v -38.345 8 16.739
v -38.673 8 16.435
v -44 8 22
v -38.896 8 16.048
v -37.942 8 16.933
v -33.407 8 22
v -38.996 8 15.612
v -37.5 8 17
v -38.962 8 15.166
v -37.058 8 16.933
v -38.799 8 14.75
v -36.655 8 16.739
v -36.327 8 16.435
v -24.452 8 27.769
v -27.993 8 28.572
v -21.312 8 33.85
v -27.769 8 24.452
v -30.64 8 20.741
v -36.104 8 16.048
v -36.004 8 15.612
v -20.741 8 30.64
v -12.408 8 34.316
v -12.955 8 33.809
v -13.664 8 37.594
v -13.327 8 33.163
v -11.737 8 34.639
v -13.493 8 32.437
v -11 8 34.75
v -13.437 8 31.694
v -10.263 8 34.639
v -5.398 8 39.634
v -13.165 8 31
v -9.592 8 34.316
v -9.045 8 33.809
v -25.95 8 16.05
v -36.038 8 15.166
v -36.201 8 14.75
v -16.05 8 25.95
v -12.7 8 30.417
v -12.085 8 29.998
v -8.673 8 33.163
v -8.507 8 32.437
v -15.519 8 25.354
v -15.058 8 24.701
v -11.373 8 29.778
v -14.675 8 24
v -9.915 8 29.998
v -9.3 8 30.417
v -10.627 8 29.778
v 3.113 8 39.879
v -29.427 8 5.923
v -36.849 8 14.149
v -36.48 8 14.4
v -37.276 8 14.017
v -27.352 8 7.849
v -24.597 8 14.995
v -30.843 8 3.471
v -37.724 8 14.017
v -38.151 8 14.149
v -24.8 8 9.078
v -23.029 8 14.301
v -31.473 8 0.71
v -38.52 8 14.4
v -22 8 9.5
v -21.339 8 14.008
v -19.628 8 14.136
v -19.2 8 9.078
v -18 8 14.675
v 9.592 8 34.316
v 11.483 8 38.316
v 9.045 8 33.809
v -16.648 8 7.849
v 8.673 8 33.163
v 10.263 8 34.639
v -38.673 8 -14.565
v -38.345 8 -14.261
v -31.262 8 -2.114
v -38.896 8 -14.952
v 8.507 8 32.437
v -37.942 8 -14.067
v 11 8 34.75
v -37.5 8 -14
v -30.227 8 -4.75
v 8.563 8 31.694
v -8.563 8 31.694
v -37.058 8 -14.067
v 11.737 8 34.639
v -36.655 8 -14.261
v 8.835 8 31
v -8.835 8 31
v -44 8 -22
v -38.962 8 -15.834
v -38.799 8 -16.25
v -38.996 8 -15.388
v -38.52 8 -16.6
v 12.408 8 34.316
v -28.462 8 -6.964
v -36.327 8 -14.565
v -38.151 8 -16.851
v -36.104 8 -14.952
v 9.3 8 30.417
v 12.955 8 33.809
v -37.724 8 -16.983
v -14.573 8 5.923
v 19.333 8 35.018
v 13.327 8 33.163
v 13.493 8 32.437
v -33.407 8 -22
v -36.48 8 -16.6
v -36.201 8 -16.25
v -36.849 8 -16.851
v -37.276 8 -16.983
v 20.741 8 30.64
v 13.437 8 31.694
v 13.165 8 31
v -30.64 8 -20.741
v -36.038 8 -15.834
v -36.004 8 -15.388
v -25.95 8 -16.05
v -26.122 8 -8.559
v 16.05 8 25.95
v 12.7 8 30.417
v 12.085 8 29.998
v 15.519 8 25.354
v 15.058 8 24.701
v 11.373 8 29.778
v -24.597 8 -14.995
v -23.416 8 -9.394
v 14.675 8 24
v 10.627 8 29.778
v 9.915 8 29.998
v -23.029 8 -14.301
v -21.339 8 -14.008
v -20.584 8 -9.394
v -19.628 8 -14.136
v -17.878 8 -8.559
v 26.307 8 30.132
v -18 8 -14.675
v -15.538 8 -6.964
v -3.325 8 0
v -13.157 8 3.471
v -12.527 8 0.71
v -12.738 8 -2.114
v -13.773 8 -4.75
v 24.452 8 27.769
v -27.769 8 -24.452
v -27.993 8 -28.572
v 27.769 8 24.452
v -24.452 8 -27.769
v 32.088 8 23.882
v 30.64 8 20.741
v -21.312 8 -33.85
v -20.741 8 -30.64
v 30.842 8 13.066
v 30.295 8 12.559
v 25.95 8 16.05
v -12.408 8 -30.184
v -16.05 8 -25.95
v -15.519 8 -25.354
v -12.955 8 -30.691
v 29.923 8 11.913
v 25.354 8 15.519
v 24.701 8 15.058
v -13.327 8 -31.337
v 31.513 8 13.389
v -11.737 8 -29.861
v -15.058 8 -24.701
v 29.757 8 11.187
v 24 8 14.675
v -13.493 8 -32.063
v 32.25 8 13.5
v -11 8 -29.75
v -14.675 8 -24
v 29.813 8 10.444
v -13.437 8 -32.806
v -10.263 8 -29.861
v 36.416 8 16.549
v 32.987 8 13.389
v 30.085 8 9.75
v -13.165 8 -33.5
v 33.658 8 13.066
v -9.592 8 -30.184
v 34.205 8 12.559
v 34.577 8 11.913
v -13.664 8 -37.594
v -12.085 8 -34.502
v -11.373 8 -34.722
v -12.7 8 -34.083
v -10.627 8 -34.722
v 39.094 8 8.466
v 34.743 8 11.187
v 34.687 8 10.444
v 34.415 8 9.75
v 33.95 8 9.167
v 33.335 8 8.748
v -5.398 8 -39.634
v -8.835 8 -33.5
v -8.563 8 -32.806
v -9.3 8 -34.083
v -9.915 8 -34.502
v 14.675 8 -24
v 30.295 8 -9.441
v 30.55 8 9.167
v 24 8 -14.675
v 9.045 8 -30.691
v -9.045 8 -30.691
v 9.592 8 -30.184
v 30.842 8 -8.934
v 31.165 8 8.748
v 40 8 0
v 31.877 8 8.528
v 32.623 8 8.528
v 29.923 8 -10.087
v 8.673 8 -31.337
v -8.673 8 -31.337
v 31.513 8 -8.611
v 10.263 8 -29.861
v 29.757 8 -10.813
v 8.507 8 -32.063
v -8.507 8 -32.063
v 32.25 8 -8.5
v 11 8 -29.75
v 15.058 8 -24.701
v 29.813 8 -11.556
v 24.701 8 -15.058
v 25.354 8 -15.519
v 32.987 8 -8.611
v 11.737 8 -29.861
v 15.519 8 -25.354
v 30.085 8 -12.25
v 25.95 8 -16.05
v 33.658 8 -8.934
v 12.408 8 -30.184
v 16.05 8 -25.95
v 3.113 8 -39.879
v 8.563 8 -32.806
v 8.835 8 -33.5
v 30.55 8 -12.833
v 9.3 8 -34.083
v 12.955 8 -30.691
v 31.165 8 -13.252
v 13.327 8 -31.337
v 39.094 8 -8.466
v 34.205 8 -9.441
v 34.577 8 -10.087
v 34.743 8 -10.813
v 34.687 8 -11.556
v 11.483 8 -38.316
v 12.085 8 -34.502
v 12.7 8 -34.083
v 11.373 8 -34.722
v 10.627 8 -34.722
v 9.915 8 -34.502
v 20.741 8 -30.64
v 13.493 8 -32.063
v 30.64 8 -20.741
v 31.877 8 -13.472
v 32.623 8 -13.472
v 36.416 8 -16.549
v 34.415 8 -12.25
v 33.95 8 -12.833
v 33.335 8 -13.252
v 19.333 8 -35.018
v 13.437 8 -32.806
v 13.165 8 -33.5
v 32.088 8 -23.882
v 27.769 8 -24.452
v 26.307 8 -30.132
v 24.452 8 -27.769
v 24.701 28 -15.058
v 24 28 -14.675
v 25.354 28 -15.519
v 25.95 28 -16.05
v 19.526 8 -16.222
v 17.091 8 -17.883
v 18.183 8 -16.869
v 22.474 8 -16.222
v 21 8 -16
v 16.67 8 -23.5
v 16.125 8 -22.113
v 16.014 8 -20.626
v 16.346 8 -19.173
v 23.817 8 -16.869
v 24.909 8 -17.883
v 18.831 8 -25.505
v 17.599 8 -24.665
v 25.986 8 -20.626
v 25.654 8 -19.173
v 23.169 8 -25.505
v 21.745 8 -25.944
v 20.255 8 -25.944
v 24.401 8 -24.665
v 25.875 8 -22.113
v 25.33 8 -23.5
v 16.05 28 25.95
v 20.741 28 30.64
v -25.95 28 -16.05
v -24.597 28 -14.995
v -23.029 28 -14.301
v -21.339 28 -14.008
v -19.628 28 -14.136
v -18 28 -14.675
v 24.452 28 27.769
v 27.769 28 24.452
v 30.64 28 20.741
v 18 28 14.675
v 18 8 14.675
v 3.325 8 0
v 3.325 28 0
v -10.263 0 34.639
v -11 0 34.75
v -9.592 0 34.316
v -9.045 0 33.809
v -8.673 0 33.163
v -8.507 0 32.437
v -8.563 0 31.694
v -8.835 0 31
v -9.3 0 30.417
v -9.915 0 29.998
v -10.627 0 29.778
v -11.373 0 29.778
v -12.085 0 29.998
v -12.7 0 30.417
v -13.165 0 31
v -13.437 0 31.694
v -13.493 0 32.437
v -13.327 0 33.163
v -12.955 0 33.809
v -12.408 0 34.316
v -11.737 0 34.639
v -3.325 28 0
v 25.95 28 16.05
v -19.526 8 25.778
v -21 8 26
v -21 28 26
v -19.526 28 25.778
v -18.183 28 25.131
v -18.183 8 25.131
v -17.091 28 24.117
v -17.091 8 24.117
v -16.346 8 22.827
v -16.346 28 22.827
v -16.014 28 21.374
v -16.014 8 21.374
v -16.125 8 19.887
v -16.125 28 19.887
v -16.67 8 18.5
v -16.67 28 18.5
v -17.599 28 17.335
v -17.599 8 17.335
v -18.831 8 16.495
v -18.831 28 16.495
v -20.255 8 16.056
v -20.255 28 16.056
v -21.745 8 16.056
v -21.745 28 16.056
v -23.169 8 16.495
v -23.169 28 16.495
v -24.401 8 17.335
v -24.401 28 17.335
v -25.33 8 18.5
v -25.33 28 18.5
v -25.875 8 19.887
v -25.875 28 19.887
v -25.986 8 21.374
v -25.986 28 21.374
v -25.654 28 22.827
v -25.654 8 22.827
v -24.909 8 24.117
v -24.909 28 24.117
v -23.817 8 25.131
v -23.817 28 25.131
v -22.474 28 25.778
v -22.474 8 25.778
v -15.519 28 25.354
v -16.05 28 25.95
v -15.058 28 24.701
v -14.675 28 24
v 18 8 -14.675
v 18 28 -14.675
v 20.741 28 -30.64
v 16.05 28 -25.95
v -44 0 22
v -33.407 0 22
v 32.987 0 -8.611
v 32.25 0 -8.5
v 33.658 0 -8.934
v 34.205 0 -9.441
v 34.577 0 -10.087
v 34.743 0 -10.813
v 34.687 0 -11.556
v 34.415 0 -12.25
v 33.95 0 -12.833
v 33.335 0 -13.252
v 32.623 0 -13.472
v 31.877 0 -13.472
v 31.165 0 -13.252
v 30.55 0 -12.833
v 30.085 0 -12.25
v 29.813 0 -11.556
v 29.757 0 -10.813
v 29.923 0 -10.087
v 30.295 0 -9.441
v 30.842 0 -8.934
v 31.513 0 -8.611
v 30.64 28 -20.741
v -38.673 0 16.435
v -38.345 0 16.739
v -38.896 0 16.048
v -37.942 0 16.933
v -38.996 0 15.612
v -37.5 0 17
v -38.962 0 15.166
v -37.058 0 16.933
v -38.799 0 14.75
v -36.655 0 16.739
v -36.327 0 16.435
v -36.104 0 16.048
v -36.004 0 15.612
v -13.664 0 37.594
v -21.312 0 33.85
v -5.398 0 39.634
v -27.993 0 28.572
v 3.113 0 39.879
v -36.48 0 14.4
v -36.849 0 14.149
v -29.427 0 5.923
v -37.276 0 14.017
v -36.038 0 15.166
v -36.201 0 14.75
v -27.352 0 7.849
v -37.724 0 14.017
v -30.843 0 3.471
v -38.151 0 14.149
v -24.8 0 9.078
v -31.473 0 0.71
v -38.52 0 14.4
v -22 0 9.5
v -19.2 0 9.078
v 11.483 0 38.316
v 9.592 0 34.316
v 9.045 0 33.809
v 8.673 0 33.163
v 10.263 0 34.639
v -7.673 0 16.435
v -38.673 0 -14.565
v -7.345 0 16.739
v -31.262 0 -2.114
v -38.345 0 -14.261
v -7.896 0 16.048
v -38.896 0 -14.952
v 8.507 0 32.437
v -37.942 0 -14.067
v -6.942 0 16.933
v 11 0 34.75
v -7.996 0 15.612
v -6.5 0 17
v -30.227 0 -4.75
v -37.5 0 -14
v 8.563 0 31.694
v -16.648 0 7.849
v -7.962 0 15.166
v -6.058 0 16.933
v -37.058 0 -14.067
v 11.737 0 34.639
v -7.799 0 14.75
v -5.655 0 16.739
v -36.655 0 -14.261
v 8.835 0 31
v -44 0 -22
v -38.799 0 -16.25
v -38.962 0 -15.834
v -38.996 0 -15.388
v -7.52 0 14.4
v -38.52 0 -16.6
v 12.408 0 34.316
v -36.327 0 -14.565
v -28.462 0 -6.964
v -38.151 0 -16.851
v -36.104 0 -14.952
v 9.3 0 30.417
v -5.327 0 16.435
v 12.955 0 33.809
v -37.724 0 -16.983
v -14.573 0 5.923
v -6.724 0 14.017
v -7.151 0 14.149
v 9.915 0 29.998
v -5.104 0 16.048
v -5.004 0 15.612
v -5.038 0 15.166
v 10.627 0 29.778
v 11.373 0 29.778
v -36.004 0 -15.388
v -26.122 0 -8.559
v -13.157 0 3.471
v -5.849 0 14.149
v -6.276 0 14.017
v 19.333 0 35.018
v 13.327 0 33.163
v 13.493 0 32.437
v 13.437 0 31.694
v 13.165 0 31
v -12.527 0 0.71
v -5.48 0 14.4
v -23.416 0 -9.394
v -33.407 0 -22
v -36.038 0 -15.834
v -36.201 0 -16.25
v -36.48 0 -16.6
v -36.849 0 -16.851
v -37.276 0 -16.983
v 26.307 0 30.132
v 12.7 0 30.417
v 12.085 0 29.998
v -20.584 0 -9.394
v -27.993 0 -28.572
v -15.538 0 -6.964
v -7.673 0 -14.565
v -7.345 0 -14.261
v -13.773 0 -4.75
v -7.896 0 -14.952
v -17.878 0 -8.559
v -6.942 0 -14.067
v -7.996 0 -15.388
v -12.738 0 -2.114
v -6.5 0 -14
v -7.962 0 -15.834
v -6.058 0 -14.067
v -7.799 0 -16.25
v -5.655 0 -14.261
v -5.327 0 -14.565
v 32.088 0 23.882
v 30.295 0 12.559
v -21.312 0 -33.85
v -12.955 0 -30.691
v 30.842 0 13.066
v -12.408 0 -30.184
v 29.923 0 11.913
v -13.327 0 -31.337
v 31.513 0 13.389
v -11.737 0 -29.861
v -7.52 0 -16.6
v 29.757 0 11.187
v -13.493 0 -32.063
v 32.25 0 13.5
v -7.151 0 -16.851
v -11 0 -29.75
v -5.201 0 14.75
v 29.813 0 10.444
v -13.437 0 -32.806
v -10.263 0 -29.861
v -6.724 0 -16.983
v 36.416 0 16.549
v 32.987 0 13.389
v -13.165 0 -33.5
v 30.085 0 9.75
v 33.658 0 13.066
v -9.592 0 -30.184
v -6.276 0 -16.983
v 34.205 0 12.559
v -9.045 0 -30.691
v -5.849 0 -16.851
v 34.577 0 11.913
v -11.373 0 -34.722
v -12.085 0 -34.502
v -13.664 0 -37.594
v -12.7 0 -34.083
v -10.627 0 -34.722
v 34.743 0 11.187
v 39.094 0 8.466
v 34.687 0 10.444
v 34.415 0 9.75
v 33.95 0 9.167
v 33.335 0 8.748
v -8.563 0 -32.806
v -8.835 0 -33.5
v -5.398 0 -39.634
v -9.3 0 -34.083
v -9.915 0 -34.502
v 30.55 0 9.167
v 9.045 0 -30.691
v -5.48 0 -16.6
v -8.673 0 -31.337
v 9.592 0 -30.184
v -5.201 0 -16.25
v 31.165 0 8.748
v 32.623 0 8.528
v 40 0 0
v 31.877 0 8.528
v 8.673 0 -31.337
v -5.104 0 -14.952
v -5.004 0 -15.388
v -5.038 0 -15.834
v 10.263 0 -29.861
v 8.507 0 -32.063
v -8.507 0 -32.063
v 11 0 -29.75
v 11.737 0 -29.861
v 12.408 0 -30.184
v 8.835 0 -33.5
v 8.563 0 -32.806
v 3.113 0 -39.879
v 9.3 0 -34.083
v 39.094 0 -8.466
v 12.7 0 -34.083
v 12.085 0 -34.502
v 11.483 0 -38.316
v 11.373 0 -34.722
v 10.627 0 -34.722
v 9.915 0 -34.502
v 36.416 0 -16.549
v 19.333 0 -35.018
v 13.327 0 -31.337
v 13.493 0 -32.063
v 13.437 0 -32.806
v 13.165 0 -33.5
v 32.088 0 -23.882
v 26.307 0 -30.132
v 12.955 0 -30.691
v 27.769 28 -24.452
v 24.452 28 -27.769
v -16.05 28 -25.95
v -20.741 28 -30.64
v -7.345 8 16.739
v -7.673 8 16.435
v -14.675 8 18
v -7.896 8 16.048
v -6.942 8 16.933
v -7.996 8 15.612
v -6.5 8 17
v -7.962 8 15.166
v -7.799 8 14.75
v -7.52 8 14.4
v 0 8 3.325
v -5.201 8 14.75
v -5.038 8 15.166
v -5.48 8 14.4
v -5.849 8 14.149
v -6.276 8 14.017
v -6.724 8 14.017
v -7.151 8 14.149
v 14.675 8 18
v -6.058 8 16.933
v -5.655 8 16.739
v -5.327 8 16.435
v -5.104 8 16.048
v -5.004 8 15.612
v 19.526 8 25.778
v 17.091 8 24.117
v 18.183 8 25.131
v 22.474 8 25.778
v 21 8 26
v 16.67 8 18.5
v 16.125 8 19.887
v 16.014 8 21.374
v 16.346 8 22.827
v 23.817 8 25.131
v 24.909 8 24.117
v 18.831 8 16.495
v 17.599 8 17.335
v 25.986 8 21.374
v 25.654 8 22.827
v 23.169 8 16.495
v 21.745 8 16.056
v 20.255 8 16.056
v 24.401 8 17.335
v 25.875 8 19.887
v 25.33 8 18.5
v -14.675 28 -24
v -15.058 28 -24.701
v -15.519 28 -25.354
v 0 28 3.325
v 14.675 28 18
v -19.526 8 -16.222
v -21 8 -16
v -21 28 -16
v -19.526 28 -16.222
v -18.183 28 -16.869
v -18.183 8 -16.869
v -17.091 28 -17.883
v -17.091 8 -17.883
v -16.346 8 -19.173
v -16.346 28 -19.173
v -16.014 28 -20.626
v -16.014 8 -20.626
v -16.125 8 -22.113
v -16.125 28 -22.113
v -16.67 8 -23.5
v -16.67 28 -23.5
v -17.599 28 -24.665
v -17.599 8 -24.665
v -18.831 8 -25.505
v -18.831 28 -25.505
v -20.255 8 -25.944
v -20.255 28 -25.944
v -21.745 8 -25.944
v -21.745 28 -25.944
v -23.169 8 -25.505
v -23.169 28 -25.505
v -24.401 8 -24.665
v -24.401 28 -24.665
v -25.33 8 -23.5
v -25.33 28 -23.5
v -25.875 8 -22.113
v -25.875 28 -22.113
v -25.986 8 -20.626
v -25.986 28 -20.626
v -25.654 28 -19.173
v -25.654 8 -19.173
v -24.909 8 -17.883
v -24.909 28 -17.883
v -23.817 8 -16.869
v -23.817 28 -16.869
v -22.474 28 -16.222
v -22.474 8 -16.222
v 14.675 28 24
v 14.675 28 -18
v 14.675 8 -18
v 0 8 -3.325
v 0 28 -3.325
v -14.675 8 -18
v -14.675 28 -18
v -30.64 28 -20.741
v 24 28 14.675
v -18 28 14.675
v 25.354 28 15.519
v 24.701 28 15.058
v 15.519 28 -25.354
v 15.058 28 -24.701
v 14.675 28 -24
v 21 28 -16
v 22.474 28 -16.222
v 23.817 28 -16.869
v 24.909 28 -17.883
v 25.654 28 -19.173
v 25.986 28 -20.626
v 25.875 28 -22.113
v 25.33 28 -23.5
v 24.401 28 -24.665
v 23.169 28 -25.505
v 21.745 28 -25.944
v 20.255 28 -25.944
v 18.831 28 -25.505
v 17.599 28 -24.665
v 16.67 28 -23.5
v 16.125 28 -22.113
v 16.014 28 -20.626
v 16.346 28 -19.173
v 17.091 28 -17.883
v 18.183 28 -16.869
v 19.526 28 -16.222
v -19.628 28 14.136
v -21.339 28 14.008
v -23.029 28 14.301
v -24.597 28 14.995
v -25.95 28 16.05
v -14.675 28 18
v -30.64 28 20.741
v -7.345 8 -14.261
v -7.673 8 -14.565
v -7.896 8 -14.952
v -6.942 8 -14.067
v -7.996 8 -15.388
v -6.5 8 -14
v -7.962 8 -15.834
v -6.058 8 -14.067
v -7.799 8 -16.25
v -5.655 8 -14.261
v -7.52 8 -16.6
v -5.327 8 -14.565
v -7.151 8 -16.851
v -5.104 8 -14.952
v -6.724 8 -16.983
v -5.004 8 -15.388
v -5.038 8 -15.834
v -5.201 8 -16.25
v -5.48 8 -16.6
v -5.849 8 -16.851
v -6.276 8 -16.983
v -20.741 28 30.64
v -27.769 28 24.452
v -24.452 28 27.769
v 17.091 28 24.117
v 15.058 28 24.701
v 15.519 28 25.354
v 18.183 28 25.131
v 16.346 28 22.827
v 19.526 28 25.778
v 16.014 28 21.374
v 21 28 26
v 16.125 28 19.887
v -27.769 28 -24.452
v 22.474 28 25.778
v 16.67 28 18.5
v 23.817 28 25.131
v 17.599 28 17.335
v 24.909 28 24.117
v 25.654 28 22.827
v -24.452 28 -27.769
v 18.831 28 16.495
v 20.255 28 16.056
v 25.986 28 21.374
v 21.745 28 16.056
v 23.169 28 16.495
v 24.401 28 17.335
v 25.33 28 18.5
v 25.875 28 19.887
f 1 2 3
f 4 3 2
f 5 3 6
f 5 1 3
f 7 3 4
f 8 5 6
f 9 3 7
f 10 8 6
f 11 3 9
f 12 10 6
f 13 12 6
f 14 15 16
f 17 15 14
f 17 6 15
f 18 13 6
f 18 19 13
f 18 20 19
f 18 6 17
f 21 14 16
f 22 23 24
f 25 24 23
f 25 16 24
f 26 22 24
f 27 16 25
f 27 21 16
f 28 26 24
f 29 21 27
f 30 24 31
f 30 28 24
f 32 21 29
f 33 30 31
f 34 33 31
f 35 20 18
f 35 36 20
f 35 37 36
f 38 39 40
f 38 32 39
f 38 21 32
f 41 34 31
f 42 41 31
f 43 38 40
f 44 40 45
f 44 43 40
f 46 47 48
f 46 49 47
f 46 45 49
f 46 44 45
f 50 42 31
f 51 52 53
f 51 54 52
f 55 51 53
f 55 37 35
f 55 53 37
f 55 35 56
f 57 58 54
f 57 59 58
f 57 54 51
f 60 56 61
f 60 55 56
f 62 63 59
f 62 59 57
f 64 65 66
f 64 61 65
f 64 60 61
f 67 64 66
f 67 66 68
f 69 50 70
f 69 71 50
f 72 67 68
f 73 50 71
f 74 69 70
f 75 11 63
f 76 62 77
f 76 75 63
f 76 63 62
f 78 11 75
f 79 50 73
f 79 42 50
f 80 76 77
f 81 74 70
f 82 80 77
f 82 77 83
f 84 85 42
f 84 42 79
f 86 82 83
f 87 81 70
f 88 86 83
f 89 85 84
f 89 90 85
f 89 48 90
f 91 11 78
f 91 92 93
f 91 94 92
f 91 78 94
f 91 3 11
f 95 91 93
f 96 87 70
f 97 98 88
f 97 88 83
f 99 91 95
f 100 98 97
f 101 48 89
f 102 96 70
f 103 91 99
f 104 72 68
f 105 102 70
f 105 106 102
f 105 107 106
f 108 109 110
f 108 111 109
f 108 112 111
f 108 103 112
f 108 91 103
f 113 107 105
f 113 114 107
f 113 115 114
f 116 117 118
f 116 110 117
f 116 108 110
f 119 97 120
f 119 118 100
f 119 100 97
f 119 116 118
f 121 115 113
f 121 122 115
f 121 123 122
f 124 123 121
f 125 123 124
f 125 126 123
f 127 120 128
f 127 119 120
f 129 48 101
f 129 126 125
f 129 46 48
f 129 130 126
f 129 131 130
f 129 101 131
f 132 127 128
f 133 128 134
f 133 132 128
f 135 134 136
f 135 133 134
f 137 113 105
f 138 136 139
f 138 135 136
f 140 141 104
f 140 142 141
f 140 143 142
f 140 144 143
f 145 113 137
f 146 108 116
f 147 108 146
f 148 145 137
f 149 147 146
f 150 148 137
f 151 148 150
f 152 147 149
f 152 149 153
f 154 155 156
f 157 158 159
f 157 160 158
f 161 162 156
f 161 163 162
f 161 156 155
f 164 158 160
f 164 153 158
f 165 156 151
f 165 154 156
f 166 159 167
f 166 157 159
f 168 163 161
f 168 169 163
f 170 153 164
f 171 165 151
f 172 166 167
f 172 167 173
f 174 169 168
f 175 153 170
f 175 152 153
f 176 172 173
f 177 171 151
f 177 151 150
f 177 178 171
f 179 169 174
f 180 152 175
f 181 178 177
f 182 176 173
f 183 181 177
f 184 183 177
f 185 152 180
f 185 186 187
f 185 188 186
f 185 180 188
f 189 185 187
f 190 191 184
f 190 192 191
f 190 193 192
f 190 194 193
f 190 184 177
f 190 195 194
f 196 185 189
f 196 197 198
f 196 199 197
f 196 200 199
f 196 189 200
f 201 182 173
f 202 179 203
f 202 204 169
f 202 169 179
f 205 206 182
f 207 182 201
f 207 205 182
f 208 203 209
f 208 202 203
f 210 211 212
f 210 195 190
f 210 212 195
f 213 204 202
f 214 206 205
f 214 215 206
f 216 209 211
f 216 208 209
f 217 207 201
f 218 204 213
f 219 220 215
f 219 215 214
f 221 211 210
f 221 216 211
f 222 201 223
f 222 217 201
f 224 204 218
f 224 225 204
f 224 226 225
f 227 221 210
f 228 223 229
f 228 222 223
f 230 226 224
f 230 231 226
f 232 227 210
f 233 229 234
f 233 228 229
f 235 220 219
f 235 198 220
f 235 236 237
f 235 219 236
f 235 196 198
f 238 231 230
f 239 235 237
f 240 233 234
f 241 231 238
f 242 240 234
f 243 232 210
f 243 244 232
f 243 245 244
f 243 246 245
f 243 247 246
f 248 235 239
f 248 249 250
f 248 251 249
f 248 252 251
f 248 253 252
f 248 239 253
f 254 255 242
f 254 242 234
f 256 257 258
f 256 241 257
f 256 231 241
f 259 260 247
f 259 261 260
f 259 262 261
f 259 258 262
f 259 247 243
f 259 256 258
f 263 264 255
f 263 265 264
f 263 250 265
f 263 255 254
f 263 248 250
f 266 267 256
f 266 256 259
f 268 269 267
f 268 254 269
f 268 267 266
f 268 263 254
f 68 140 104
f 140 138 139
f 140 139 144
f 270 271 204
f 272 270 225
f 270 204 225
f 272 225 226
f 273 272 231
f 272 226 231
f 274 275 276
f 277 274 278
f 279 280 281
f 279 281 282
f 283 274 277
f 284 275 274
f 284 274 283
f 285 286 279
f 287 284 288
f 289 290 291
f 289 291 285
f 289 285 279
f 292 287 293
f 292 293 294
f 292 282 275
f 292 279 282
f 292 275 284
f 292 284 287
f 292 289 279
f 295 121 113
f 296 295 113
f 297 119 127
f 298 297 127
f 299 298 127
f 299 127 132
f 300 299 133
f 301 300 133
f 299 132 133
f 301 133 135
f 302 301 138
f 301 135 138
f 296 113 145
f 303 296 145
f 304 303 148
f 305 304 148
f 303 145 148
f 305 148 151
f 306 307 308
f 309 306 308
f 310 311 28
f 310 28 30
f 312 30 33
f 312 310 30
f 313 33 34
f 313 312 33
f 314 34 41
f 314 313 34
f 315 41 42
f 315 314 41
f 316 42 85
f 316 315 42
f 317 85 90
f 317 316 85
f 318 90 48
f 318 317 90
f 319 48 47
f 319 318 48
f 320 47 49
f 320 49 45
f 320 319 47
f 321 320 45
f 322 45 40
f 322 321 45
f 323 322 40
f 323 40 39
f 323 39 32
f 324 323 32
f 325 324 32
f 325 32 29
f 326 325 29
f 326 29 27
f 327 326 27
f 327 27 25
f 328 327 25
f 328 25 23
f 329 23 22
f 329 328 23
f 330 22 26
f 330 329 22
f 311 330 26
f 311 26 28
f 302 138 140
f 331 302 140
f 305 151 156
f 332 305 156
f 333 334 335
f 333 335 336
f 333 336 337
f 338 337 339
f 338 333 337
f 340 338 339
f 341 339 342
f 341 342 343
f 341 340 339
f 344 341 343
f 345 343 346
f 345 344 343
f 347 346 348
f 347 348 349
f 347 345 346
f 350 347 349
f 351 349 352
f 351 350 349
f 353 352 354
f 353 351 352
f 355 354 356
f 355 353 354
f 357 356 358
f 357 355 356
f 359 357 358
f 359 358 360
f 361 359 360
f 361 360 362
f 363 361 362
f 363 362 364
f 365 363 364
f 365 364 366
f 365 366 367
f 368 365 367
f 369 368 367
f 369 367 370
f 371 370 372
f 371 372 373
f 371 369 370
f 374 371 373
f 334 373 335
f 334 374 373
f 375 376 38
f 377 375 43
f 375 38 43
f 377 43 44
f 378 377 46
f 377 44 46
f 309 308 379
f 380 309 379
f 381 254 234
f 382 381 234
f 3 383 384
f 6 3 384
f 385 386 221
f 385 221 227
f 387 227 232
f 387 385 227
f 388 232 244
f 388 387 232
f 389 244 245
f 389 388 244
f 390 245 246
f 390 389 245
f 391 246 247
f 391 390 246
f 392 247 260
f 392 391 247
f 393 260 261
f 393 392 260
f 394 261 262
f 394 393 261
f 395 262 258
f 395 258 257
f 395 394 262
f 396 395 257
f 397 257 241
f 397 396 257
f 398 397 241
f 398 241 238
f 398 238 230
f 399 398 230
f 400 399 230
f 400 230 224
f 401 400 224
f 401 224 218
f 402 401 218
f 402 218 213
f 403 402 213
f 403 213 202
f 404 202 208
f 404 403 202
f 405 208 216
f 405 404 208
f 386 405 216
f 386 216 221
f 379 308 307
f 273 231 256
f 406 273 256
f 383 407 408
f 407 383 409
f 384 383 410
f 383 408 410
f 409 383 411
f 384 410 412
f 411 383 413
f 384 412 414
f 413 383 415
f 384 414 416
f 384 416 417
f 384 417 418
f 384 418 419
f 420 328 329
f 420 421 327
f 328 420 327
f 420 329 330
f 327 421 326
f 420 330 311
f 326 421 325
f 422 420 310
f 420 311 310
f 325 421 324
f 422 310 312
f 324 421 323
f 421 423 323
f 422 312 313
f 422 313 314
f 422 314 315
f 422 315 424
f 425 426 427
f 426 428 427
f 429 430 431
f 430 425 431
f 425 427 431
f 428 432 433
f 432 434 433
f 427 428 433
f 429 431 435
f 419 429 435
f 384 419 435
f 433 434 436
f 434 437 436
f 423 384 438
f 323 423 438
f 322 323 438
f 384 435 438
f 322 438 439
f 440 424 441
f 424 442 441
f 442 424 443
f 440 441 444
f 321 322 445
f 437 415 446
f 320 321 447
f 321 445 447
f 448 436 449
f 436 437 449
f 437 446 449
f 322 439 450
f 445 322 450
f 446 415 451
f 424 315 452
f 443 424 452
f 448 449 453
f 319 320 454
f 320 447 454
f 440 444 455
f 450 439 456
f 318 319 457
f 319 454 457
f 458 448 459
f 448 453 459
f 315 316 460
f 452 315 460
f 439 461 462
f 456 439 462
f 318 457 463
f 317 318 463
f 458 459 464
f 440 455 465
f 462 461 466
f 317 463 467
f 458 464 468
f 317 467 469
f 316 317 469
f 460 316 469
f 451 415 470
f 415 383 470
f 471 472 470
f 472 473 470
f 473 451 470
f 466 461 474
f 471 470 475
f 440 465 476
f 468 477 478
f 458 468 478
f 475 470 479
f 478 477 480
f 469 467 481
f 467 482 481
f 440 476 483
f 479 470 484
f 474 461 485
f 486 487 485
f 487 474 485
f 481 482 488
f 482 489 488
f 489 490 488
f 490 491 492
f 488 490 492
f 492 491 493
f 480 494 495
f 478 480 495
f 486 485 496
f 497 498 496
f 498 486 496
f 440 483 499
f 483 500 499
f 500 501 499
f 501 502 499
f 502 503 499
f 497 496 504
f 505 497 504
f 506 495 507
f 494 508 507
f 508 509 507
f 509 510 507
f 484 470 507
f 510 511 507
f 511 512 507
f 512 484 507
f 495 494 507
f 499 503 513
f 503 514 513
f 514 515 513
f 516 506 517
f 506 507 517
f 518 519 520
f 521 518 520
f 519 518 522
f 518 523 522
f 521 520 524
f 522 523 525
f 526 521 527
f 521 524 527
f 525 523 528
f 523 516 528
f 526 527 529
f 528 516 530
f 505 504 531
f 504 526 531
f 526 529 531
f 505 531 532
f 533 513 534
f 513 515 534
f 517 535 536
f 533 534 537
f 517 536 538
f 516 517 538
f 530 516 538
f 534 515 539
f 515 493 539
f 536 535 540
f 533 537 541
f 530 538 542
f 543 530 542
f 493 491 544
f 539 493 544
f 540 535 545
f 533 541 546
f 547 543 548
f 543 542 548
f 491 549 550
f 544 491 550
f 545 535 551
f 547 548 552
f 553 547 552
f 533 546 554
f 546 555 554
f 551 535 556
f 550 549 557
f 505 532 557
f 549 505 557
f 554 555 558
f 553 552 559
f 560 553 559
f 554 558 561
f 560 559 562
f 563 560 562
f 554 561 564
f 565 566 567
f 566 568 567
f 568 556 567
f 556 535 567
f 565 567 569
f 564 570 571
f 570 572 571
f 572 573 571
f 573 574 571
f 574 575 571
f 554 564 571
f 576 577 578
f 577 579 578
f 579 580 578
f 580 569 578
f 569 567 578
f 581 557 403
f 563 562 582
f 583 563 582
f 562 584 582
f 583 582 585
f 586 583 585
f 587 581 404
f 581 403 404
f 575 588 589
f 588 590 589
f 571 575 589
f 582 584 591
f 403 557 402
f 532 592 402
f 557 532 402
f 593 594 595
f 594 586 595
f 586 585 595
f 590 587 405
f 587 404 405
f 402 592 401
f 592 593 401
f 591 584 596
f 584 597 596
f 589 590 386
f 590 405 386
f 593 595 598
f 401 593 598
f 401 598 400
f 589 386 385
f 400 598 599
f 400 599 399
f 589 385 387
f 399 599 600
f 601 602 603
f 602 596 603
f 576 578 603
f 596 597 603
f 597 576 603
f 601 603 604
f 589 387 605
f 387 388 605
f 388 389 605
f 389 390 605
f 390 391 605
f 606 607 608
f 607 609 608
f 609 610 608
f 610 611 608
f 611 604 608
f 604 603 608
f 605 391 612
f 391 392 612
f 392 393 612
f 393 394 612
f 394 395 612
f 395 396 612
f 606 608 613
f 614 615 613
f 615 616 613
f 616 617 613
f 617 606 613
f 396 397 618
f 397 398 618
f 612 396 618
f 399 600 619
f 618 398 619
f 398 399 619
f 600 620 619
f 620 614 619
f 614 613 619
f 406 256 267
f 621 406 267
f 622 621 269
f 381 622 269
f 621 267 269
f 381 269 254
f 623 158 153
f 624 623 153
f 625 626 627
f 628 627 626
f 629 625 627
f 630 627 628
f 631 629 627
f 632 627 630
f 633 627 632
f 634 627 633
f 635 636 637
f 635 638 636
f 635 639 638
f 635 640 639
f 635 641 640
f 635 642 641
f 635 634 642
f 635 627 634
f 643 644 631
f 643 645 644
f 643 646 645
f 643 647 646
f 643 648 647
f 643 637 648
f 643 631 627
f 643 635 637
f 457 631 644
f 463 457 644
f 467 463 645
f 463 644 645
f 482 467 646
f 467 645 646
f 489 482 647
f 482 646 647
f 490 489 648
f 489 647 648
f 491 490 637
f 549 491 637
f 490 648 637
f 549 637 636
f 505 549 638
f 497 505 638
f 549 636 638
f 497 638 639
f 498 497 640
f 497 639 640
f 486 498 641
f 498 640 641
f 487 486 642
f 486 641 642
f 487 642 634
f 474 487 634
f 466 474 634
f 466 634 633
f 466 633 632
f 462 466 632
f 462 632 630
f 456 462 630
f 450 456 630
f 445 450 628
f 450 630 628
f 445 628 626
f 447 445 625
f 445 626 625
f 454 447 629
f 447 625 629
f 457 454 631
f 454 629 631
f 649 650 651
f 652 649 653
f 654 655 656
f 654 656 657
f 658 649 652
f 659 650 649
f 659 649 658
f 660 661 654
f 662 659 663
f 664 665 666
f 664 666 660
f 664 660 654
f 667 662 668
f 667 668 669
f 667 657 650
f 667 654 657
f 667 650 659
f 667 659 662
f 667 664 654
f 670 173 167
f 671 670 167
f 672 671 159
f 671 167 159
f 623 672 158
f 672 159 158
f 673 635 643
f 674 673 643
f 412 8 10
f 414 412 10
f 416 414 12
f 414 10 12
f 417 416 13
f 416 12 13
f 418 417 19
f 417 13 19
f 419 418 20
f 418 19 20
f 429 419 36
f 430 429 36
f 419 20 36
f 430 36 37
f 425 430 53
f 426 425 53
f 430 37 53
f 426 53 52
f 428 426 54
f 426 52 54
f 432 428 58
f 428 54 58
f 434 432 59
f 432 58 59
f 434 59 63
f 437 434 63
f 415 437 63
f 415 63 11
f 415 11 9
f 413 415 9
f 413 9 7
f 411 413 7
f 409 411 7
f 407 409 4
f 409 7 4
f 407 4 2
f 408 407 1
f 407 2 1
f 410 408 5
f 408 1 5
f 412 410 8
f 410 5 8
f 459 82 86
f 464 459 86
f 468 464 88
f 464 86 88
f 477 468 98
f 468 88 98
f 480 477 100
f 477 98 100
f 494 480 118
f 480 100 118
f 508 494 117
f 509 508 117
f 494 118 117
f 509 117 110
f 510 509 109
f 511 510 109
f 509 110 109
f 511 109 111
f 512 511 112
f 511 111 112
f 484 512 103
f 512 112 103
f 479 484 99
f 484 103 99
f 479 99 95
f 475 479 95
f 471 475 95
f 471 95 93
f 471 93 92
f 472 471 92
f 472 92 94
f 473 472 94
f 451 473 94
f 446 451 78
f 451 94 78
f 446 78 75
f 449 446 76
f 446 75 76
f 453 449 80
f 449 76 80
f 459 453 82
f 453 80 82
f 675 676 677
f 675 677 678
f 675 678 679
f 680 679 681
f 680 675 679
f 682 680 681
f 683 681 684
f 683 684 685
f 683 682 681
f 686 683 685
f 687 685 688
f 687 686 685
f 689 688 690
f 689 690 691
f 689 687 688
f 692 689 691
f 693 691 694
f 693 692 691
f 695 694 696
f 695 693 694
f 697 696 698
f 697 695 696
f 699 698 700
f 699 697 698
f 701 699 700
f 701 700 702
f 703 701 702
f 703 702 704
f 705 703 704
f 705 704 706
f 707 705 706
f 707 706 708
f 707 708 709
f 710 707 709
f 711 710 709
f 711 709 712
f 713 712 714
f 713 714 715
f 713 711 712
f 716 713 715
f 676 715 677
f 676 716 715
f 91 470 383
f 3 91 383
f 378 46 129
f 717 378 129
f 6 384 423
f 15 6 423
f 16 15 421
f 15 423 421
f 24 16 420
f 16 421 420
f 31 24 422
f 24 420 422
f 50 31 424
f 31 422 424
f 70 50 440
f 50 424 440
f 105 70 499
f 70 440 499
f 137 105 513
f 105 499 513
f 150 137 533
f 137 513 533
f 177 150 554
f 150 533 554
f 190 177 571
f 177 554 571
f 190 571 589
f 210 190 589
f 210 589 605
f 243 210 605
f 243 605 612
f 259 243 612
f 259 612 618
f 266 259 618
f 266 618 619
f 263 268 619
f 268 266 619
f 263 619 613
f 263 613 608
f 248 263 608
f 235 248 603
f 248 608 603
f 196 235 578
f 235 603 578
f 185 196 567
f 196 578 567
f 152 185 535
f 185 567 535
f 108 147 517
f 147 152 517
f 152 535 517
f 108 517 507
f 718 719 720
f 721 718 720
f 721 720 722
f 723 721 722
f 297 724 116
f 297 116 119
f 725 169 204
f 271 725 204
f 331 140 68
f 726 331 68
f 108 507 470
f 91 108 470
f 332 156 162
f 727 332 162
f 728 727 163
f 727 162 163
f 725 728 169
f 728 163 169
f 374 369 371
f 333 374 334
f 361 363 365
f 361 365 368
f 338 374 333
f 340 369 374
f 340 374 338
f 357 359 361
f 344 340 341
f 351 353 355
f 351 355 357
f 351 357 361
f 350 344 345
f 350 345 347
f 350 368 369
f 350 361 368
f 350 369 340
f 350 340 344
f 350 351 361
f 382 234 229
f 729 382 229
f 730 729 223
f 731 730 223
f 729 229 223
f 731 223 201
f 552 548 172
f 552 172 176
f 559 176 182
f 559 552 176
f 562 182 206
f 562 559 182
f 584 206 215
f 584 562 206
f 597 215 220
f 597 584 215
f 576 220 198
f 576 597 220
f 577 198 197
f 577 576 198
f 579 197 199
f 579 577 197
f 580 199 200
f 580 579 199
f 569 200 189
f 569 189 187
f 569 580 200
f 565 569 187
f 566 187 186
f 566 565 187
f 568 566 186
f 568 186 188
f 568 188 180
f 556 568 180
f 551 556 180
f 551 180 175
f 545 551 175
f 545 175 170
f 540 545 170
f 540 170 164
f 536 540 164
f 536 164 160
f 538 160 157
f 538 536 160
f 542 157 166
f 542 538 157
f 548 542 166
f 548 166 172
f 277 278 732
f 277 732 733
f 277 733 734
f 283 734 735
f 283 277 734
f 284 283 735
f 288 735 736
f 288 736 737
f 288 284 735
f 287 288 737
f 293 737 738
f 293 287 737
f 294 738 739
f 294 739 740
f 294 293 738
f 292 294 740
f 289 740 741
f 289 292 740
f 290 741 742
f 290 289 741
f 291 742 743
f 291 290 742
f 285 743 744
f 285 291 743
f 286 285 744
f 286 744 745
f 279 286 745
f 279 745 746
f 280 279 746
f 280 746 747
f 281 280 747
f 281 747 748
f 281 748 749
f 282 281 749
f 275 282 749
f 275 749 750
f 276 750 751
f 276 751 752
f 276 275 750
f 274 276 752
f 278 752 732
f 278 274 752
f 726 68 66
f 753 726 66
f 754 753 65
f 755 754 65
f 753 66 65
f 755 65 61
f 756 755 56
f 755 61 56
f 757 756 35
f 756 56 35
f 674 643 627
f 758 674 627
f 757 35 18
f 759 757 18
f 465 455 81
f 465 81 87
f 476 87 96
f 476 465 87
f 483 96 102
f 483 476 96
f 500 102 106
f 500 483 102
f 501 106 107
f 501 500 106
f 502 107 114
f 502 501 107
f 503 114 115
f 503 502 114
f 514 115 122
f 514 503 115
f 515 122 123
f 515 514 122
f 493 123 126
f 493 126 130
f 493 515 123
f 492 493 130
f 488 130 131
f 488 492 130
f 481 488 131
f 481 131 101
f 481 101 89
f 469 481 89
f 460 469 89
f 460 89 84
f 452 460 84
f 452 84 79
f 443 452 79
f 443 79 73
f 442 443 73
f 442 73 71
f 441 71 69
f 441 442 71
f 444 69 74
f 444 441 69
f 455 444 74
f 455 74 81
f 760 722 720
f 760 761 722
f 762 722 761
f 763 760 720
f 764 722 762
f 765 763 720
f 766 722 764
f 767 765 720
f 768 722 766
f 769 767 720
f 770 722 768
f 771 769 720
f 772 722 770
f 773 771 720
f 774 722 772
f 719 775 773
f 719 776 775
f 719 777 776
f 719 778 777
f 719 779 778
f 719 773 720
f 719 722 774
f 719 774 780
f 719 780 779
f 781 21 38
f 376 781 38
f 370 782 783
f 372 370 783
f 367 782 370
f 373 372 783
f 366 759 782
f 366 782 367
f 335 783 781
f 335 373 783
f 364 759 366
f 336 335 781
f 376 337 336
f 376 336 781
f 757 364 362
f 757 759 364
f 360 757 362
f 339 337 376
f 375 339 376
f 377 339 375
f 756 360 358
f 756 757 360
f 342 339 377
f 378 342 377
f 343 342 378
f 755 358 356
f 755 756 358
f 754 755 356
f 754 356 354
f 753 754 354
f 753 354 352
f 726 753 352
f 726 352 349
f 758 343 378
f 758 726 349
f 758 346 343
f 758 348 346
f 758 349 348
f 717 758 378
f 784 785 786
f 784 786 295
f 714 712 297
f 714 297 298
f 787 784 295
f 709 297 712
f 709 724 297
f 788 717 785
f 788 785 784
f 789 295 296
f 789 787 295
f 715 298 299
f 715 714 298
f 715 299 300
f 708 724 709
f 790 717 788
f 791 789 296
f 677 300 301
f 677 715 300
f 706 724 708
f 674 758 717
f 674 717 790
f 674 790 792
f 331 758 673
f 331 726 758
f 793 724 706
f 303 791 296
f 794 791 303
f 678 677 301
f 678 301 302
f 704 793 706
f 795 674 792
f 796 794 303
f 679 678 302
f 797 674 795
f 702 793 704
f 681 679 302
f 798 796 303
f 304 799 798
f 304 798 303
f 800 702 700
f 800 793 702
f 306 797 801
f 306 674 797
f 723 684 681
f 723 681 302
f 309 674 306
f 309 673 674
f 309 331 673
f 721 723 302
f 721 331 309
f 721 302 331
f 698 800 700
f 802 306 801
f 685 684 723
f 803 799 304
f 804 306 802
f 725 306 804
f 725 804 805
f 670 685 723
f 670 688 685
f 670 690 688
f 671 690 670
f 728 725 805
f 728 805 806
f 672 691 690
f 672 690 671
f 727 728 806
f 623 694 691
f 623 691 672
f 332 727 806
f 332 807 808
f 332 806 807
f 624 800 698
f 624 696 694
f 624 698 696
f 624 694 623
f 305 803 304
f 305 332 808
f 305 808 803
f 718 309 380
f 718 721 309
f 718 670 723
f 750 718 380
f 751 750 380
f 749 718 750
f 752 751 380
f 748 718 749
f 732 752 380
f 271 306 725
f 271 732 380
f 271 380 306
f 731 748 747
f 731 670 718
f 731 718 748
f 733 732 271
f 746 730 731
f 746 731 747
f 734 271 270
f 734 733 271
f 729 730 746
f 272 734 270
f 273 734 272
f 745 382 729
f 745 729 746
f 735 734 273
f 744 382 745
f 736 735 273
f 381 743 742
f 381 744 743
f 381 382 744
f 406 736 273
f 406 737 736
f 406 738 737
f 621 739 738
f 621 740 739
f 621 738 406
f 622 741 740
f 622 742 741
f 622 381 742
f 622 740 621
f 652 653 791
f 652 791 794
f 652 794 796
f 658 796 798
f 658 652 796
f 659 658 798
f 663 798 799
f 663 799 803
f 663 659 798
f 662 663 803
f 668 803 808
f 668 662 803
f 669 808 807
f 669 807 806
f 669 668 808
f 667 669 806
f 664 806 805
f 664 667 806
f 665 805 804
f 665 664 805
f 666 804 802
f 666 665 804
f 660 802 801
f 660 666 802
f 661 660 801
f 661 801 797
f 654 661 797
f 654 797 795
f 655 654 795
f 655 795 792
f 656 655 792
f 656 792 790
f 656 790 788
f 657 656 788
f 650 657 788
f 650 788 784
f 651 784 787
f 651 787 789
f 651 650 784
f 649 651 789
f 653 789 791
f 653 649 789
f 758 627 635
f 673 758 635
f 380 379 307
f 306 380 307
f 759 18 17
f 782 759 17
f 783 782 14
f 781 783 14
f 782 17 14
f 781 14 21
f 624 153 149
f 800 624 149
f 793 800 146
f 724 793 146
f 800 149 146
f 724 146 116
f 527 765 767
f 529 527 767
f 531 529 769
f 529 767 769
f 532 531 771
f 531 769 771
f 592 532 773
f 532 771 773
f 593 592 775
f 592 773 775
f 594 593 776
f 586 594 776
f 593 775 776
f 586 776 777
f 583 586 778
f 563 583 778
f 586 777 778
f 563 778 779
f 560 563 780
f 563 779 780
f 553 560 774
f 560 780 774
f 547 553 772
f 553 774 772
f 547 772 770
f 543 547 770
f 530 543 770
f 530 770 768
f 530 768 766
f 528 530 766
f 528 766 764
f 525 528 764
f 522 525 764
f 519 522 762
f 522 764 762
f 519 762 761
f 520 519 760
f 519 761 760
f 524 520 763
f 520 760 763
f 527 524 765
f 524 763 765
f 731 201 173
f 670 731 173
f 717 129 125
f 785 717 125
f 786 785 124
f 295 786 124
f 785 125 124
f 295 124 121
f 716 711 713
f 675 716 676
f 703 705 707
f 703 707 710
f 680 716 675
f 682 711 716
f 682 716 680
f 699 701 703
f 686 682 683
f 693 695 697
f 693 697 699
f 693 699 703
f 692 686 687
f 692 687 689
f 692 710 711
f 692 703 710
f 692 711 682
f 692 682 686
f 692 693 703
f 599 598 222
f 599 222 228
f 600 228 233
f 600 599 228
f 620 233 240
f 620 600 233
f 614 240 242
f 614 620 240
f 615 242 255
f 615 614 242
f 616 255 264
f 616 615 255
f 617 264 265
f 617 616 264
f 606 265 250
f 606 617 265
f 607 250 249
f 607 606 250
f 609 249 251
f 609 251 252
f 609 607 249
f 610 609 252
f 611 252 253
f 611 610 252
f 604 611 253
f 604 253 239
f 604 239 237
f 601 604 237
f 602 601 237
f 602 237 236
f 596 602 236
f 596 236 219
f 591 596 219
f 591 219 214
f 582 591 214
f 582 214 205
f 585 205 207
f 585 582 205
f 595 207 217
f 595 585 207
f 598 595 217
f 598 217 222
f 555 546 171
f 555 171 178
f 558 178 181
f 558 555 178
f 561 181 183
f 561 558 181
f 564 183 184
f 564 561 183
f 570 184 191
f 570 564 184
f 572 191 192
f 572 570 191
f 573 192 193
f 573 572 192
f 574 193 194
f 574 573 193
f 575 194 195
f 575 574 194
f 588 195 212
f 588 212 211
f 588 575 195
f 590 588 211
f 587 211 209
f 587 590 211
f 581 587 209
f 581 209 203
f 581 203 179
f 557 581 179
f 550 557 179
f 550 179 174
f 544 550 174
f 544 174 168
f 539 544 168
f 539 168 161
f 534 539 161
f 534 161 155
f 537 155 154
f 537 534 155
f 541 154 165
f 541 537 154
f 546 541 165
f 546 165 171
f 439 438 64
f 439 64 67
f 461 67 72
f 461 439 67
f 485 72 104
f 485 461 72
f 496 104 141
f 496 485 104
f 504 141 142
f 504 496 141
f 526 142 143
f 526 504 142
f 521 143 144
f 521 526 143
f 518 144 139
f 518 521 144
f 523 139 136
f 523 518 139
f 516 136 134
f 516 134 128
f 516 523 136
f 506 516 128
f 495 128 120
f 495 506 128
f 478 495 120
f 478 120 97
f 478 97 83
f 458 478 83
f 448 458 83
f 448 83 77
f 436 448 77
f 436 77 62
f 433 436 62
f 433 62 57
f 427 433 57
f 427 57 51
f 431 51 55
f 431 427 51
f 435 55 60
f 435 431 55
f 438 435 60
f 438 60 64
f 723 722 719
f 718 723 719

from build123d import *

# Parameters (mm, degrees)
SKETCH1_R           = 40
SKETCH1_R_2         = 9.5
SKETCH1_R_3         = 2.5
BOSS_EXTRUDE2_DEPTH = 8
SKETCH3_R           = 1.5
CUT_EXTRUDE1_DEPTH  = 8
SKETCH4_R           = 7
SKETCH4_R_2         = 5
BOSS_EXTRUDE6_DEPTH = 20


with BuildPart() as part:
    # Sketch1 → Boss-Extrude2 (new body)
    # profile 1 of 2: a face of its own
    with BuildSketch(Plane(origin=(0, 0, 0), x_dir=(1, 0, 0), z_dir=(0, 1, 0))):
        with BuildLine():
            Line((-44, 22), (-44, -22))
            Line((-44, -22), (-33.406586177, -22))
            ThreePointArc((-33.406586177, -22), (-40, 0), (-33.406586177, 22))
            Line((-33.406586177, 22), (-44, 22))
        make_face()
    # profile 2 of 2: a face of its own
    with BuildSketch(Plane(origin=(0, 0, 0), x_dir=(1, 0, 0), z_dir=(0, 1, 0))):
        Circle(SKETCH1_R)
        with Locations(Location((-22, 0, 0), (0, 0, 270))):
            Circle(SKETCH1_R_2, mode=Mode.SUBTRACT)
        with Locations(Location((11, 32.25, 0), (0, 0, 270))):
            Circle(SKETCH1_R_3, mode=Mode.SUBTRACT)
        with Locations(Location((-11, 32.25, 0), (0, 0, 270))):
            Circle(SKETCH1_R_3, mode=Mode.SUBTRACT)
        with Locations(Location((11, -32.25, 0), (0, 0, 270))):
            Circle(SKETCH1_R_3, mode=Mode.SUBTRACT)
        with Locations(Location((-11, -32.25, 0), (0, 0, 270))):
            Circle(SKETCH1_R_3, mode=Mode.SUBTRACT)
        with Locations(Location((32.25, -11, 0), (0, 0, 270))):
            Circle(SKETCH1_R_3, mode=Mode.SUBTRACT)
        with Locations(Location((32.25, 11, 0), (0, 0, 270))):
            Circle(SKETCH1_R_3, mode=Mode.SUBTRACT)
    extrude(amount=BOSS_EXTRUDE2_DEPTH)

    # Sketch3 → Cut-Extrude1 (cut)
    with BuildSketch(Plane(origin=(0, 8, 0), x_dir=(1, 0, 0), z_dir=(0, 1, 0))):
        with Locations(Location((-37.5, 15.5, 0), (0, 0, 270))):
            Circle(SKETCH3_R)
        with Locations(Location((-6.5, 15.5, 0), (0, 0, 270))):
            Circle(SKETCH3_R)
        with Locations(Location((-6.5, -15.5, 0), (0, 0, 270))):
            Circle(SKETCH3_R)
        with Locations(Location((-37.5, -15.5, 0), (0, 0, 270))):
            Circle(SKETCH3_R)
    extrude(amount=-CUT_EXTRUDE1_DEPTH, mode=Mode.SUBTRACT)

    # Sketch4 → Boss-Extrude6 (add)
    # profile 1 of 16: a face of its own
    with BuildSketch(Plane(origin=(0, 8, 0), x_dir=(1, 0, 0), z_dir=(0, 1, 0))):
        with Locations((-21, -21)):
            Circle(SKETCH4_R)
        with Locations(Location((-21, -21, 0), (0, 0, 270))):
            Circle(SKETCH4_R_2, mode=Mode.SUBTRACT)
    # profile 2 of 16: a face of its own
    with BuildSketch(Plane(origin=(0, 8, 0), x_dir=(1, 0, 0), z_dir=(0, 1, 0))):
        with BuildLine():
            ThreePointArc((-16.050252532, -25.949747468), (-25.949747468, -25.949747468), (-25.949747468, -16.050252532))
            Line((-25.949747468, -16.050252532), (-30.640212626, -20.740717689))
            ThreePointArc((-30.640212626, -20.740717689), (-26.162950904, -26.162950904), (-20.740717689, -30.640212626))
            Line((-20.740717689, -30.640212626), (-16.050252532, -25.949747468))
        make_face()
    # profile 3 of 16: a face of its own
    with BuildSketch(Plane(origin=(0, 8, 0), x_dir=(1, 0, 0), z_dir=(0, 1, 0))):
        with BuildLine():
            Line((-14.67544468, -18), (0, -3.32455532))
            Line((0, -3.32455532), (-3.32455532, 0))
            Line((-3.32455532, 0), (-18, -14.67544468))
            ThreePointArc((-18, -14.67544468), (-16.050252532, -16.050252532), (-14.67544468, -18))
        make_face()
    # profile 4 of 16: a face of its own
    with BuildSketch(Plane(origin=(0, 8, 0), x_dir=(1, 0, 0), z_dir=(0, 1, 0))):
        with BuildLine():
            ThreePointArc((14.67544468, -24), (14, -21), (14.67544468, -18))
            Line((14.67544468, -18), (14, -18))
            Line((14, -18), (-14.67544468, -18))
            ThreePointArc((-14.67544468, -18), (-14.170948556, -19.462451178), (-14, -21))
            ThreePointArc((-14, -21), (-14.170948556, -22.537548822), (-14.67544468, -24))
            Line((-14.67544468, -24), (14, -24))
            Line((14, -24), (14.67544468, -24))
        make_face()
    # profile 5 of 16: a face of its own
    with BuildSketch(Plane(origin=(0, 8, 0), x_dir=(1, 0, 0), z_dir=(0, 1, 0))):
        with Locations((21, -21)):
            Circle(SKETCH4_R)
        with Locations(Location((21, -21, 0), (0, 0, 270))):
            Circle(SKETCH4_R_2, mode=Mode.SUBTRACT)
    # profile 6 of 16: a face of its own
    with BuildSketch(Plane(origin=(0, 8, 0), x_dir=(1, 0, 0), z_dir=(0, 1, 0))):
        with BuildLine():
            Line((30.640212626, -20.740717689), (25.949747468, -16.050252532))
            ThreePointArc((25.949747468, -16.050252532), (27.467156728, -18.321215973), (28, -21))
            ThreePointArc((28, -21), (23.678784027, -27.467156728), (16.050252532, -25.949747468))
            Line((16.050252532, -25.949747468), (20.740717689, -30.640212626))
            ThreePointArc((20.740717689, -30.640212626), (26.162950904, -26.162950904), (30.640212626, -20.740717689))
        make_face()
    # profile 7 of 16: a face of its own
    with BuildSketch(Plane(origin=(0, 8, 0), x_dir=(1, 0, 0), z_dir=(0, 1, 0))):
        with BuildLine():
            ThreePointArc((14.67544468, -18), (16.050252532, -16.050252532), (18, -14.67544468))
            Line((18, -14.67544468), (3.32455532, 0))
            Line((3.32455532, 0), (0, -3.32455532))
            Line((0, -3.32455532), (14.67544468, -18))
        make_face()
    # profile 8 of 16: a face of its own
    with BuildSketch(Plane(origin=(0, 8, 0), x_dir=(1, 0, 0), z_dir=(0, 1, 0))):
        with BuildLine():
            Line((24, -14.446329174), (24, 14))
            Line((24, 14), (24, 14.67544468))
            ThreePointArc((24, 14.67544468), (21, 14), (18, 14.67544468))
            Line((18, 14.67544468), (18, 14))
            Line((18, 14), (18, -14.111462488))
            Line((18, -14.111462488), (18, -14.67544468))
            ThreePointArc((18, -14.67544468), (21, -14), (24, -14.67544468))
            Line((24, -14.67544468), (24, -14.446329174))
        make_face()
    # profile 9 of 16: a face of its own
    with BuildSketch(Plane(origin=(0, 8, 0), x_dir=(1, 0, 0), z_dir=(0, 1, 0))):
        with BuildLine():
            Line((3.32455532, 0), (18, 14.67544468))
            ThreePointArc((18, 14.67544468), (16.050252532, 16.050252532), (14.67544468, 18))
            Line((14.67544468, 18), (0, 3.32455532))
            Line((0, 3.32455532), (3.32455532, 0))
        make_face()
    # profile 10 of 16: a face of its own
    with BuildSketch(Plane(origin=(0, 8, 0), x_dir=(1, 0, 0), z_dir=(0, 1, 0))):
        Polygon((0, -3.32455532), (3.32455532, 0), (0, 3.32455532), (-3.32455532, 0), align=None)
    # profile 11 of 16: a face of its own
    with BuildSketch(Plane(origin=(0, 8, 0), x_dir=(1, 0, 0), z_dir=(0, 1, 0))):
        with BuildLine():
            Line((-3.32455532, 0), (0, 3.32455532))
            Line((0, 3.32455532), (-14.67544468, 18))
            ThreePointArc((-14.67544468, 18), (-16.050252532, 16.050252532), (-18, 14.67544468))
            Line((-18, 14.67544468), (-3.32455532, 0))
        make_face()
    # profile 12 of 16: a face of its own
    with BuildSketch(Plane(origin=(0, 8, 0), x_dir=(1, 0, 0), z_dir=(0, 1, 0))):
        with BuildLine():
            Line((13.75, 18), (14.67544468, 18))
            ThreePointArc((14.67544468, 18), (14, 21), (14.67544468, 24))
            Line((14.67544468, 24), (-13, 24))
            Line((-13, 24), (-13.890574763, 24))
            Line((-13.890574763, 24), (-14.67544468, 24))
            ThreePointArc((-14.67544468, 24), (-14.170948556, 22.537548822), (-14, 21))
            ThreePointArc((-14, 21), (-14.170948556, 19.462451178), (-14.67544468, 18))
            Line((-14.67544468, 18), (-14.243300619, 18))
            Line((-14.243300619, 18), (13.75, 18))
        make_face()
    # profile 13 of 16: a face of its own
    with BuildSketch(Plane(origin=(0, 8, 0), x_dir=(1, 0, 0), z_dir=(0, 1, 0))):
        with Locations((21, 21)):
            Circle(SKETCH4_R)
        with Locations(Location((21, 21, 0), (0, 0, 270))):
            Circle(SKETCH4_R_2, mode=Mode.SUBTRACT)
    # profile 14 of 16: a face of its own
    with BuildSketch(Plane(origin=(0, 8, 0), x_dir=(1, 0, 0), z_dir=(0, 1, 0))):
        with BuildLine():
            ThreePointArc((28, 21), (27.467156728, 18.321215973), (25.949747468, 16.050252532))
            Line((25.949747468, 16.050252532), (30.640212626, 20.740717689))
            ThreePointArc((30.640212626, 20.740717689), (26.162950904, 26.162950904), (20.740717689, 30.640212626))
            Line((20.740717689, 30.640212626), (16.050252532, 25.949747468))
            ThreePointArc((16.050252532, 25.949747468), (23.678784027, 27.467156728), (28, 21))
        make_face()
    # profile 15 of 16: a face of its own
    with BuildSketch(Plane(origin=(0, 8, 0), x_dir=(1, 0, 0), z_dir=(0, 1, 0))):
        with BuildLine():
            Line((-16.050252532, 25.949747468), (-20.740717689, 30.640212626))
            ThreePointArc((-20.740717689, 30.640212626), (-26.162950904, 26.162950904), (-30.640212626, 20.740717689))
            Line((-30.640212626, 20.740717689), (-25.949747469, 16.050252532))
            ThreePointArc((-25.949747469, 16.050252532), (-25.949747469, 25.949747468), (-16.050252532, 25.949747468))
        make_face()
    # profile 16 of 16: a face of its own
    with BuildSketch(Plane(origin=(0, 8, 0), x_dir=(1, 0, 0), z_dir=(0, 1, 0))):
        with Locations((-21, 21)):
            Circle(SKETCH4_R)
        with Locations(Location((-21, 21, 0), (0, 0, 270))):
            Circle(SKETCH4_R_2, mode=Mode.SUBTRACT)
    extrude(amount=BOSS_EXTRUDE6_DEPTH)


solid = part.part
